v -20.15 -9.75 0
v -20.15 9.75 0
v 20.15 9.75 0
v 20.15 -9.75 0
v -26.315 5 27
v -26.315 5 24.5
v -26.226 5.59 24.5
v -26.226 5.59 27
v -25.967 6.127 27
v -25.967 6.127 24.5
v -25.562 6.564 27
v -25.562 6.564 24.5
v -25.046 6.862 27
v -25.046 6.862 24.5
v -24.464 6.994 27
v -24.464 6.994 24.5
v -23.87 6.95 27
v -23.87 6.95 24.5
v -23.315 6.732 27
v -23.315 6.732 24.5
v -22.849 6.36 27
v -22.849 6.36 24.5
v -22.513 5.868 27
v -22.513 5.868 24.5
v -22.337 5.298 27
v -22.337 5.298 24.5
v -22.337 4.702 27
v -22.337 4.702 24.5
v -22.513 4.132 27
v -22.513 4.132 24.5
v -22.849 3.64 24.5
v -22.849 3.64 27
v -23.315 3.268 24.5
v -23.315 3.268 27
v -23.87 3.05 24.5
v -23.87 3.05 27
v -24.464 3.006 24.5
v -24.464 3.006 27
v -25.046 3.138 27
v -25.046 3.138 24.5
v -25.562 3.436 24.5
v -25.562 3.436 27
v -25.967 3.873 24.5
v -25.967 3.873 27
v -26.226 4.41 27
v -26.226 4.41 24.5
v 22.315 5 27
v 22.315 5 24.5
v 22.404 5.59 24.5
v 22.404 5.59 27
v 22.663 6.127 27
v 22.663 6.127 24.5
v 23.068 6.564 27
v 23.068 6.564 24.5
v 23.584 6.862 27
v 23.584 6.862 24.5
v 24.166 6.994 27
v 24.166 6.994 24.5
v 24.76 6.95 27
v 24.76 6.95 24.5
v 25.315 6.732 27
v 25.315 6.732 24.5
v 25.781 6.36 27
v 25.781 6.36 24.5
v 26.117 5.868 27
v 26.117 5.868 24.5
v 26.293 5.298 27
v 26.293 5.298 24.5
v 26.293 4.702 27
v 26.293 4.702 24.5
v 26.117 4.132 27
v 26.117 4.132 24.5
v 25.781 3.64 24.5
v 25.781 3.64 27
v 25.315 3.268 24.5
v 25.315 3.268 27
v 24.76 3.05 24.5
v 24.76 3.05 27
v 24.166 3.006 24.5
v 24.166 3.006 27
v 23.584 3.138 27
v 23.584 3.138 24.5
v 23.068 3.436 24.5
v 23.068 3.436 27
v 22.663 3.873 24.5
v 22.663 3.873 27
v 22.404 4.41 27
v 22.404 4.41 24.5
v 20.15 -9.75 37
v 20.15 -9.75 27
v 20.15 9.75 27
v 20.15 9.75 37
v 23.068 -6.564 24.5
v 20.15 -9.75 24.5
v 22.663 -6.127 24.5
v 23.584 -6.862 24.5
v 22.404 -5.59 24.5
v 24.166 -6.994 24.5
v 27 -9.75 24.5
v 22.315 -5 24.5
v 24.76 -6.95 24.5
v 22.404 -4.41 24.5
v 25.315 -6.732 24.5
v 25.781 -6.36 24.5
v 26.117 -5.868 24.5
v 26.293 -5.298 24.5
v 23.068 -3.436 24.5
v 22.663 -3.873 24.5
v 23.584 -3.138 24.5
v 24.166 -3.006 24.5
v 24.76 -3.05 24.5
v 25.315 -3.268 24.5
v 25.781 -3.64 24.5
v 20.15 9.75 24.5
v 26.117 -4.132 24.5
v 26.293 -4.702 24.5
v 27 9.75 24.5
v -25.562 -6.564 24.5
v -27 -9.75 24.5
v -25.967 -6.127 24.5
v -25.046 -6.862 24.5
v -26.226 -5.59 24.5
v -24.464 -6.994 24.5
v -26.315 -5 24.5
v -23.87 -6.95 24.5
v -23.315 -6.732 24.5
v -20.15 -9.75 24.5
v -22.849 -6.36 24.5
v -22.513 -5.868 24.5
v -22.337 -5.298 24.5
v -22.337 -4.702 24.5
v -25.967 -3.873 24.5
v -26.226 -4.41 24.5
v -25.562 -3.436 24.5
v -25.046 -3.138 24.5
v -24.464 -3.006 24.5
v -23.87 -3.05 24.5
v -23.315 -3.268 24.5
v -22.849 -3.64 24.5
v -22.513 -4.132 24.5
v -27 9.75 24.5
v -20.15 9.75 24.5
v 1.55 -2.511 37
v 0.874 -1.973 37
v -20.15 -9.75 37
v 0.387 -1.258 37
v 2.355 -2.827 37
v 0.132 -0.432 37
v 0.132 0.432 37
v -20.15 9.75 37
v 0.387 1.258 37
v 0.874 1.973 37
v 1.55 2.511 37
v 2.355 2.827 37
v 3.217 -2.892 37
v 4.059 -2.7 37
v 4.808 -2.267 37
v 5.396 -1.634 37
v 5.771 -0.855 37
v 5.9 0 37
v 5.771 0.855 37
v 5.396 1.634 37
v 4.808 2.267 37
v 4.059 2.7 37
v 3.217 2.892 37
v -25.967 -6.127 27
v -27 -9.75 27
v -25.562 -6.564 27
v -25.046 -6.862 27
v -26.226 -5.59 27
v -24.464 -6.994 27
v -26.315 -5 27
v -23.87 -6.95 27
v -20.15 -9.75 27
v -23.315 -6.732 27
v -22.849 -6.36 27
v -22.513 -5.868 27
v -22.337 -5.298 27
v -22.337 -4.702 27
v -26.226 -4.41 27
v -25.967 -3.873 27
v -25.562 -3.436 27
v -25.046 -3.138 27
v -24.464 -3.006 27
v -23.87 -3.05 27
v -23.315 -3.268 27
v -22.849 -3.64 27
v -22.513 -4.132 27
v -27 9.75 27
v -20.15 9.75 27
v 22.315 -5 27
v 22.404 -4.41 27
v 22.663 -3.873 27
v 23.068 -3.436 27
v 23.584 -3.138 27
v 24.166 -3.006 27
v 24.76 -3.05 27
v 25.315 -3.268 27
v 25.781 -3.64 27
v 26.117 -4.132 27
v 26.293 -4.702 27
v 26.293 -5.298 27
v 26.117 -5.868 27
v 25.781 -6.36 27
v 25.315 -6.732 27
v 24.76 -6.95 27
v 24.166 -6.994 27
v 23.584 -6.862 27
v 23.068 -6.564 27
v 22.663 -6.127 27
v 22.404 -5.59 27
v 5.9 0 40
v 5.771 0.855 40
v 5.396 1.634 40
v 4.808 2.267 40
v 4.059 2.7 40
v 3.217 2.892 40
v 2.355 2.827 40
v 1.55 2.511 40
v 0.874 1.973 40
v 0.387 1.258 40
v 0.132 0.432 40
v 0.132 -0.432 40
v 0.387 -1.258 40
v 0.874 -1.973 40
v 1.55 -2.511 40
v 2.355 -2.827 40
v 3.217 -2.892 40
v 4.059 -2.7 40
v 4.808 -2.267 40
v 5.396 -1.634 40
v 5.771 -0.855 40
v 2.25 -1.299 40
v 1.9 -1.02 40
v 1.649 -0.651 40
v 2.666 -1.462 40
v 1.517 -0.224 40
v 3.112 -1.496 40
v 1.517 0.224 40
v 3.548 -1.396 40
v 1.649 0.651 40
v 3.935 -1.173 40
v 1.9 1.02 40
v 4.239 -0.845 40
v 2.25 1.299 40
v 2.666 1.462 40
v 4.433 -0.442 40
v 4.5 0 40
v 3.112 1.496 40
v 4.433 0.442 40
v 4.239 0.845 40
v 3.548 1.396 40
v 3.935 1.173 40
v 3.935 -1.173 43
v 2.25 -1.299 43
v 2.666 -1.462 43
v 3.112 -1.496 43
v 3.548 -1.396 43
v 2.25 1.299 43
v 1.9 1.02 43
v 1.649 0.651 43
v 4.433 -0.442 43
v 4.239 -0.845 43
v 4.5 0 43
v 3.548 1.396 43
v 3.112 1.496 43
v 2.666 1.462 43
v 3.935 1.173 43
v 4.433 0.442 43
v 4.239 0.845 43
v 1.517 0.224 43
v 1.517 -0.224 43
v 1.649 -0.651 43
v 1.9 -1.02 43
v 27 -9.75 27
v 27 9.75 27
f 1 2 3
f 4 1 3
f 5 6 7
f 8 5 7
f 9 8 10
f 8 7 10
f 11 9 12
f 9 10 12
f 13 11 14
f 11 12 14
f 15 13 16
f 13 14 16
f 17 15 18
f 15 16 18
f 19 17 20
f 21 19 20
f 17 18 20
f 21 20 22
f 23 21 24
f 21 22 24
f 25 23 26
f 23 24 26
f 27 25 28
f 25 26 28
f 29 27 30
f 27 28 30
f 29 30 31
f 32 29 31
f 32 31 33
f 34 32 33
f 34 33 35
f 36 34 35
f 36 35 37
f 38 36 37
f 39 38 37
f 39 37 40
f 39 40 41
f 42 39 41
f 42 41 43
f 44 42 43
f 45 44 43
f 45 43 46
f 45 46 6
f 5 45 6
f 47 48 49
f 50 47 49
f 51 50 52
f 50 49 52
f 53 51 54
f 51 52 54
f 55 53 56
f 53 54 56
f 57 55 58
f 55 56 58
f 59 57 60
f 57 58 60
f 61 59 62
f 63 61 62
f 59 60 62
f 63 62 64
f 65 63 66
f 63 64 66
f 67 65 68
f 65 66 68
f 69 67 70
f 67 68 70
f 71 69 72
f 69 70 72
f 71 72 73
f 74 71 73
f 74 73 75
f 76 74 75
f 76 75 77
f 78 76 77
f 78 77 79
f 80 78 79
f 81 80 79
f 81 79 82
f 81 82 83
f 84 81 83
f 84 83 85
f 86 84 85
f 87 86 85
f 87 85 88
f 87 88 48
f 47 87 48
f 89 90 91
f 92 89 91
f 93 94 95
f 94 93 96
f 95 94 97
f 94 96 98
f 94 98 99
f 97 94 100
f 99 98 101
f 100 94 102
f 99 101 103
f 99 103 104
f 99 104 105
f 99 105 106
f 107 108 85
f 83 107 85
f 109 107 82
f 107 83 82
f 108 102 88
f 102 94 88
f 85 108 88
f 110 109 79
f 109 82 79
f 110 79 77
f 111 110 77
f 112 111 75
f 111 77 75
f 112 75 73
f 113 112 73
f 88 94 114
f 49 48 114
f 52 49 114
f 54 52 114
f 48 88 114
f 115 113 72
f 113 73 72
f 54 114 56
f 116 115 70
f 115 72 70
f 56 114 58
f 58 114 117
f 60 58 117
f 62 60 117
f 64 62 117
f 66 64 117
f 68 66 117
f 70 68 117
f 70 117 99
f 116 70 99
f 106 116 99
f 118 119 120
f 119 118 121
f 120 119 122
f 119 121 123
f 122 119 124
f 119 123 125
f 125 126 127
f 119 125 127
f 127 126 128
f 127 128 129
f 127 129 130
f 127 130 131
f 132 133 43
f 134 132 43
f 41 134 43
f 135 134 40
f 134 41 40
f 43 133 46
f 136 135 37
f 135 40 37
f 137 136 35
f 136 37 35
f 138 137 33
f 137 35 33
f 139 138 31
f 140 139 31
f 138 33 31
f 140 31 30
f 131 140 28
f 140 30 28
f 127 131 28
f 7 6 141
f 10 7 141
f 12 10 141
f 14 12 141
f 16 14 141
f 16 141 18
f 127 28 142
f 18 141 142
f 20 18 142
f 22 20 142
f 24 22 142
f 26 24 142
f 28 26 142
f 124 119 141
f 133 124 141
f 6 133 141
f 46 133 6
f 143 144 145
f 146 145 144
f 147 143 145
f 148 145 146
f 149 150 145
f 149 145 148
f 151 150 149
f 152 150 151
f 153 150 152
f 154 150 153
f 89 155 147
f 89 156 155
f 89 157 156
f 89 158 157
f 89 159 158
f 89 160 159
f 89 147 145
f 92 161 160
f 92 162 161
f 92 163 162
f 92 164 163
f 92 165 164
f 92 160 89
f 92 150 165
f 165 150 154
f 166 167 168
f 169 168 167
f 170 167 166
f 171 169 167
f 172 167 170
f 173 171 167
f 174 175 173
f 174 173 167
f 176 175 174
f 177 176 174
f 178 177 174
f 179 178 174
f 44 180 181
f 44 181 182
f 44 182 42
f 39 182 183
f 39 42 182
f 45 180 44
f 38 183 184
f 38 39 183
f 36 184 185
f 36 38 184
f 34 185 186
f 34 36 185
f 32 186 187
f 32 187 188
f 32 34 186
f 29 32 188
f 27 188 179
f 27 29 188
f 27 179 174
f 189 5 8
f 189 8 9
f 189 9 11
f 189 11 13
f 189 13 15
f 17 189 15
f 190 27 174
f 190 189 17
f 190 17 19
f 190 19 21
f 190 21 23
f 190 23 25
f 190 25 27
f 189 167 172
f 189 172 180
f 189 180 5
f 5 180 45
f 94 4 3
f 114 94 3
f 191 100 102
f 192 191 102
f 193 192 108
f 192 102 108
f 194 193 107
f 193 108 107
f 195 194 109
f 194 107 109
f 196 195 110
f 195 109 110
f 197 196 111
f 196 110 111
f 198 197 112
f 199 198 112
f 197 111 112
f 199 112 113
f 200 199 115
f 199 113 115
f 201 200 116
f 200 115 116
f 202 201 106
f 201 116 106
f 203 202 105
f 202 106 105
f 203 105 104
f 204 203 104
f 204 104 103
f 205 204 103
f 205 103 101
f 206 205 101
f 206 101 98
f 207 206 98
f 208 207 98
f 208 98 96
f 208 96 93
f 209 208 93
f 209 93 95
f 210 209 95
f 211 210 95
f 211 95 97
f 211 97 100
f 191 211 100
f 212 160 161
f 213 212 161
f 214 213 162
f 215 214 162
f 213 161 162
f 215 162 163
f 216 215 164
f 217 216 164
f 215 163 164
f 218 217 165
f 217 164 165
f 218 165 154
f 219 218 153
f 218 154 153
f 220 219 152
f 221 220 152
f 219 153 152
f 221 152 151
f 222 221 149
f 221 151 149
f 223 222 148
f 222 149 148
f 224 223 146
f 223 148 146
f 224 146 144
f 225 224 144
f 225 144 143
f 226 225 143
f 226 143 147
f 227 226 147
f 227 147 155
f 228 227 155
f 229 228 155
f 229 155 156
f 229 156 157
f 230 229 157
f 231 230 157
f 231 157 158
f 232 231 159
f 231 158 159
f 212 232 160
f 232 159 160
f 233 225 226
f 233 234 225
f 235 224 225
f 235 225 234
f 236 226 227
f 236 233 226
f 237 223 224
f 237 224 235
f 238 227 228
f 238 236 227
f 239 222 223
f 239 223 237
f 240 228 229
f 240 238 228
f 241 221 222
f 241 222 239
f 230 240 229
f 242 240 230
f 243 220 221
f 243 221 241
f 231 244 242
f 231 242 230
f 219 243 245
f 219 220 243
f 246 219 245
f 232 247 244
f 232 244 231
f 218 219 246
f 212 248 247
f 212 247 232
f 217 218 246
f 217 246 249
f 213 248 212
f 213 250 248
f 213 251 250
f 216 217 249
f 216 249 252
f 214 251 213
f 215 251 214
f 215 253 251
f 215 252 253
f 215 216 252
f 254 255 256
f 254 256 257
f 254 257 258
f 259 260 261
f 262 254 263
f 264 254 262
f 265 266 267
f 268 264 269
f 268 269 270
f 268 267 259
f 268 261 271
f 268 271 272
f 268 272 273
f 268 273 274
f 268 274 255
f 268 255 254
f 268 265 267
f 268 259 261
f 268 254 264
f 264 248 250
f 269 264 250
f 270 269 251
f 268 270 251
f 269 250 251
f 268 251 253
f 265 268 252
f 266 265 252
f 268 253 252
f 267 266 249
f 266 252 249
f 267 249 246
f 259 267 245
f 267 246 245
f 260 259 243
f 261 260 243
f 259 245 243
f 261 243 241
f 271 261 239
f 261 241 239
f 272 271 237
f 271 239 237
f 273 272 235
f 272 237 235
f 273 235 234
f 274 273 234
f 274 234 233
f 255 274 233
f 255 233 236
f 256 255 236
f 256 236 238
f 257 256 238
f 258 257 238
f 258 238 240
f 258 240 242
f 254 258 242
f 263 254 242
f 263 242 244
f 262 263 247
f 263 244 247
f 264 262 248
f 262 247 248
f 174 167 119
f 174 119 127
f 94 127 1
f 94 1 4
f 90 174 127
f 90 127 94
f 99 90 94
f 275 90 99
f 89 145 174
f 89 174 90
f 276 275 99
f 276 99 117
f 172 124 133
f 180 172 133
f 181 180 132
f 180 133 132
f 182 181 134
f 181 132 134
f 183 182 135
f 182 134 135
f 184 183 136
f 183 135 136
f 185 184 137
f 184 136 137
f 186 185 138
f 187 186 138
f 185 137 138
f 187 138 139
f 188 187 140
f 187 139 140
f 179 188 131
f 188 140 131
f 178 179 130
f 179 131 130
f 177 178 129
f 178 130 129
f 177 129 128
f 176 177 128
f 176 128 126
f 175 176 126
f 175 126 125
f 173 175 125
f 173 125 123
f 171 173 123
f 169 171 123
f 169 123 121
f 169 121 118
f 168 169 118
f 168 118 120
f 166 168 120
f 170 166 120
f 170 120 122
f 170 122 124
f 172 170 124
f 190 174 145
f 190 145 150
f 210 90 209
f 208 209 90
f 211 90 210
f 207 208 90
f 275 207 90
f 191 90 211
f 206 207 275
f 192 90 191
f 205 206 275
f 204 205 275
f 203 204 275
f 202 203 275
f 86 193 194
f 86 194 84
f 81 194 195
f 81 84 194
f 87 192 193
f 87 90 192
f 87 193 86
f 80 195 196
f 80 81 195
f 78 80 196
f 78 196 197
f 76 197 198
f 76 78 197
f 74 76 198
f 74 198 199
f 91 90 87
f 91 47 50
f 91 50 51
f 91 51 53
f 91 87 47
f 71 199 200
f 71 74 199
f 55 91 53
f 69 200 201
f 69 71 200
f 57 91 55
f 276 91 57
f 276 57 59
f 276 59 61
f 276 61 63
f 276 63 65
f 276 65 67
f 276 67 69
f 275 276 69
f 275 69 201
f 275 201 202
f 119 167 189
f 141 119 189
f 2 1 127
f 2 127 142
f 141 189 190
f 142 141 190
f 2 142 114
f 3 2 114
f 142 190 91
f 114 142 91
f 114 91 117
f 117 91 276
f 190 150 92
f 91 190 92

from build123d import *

# Parameters (mm, degrees)
SKETCH_1_W      = 40.3
SKETCH_1_H      = 19.5
EXTRUDE_1_DEPTH = 37
SKETCH_2_R      = 2.9
EXTRUDE_2_DEPTH = 3
SKETCH_3_R      = 1.5
EXTRUDE_3_DEPTH = 3
SKETCH_4_W      = 54
SKETCH_4_H      = 19.5
EXTRUDE_4_DEPTH = 2.5
MM_1_D          = 4
MM_1_DEPTH      = 7.5
MM_1_TIP        = 1.201721238


with BuildPart() as part:
    # 草图1 → 凸台-拉伸1 (new body)
    with BuildSketch(Plane.XY):
        Rectangle(SKETCH_1_W, SKETCH_1_H)
    extrude(amount=EXTRUDE_1_DEPTH)

    # 草图2 → 凸台-拉伸2 (add)
    with BuildSketch(Plane.XY.offset(37)):
        with Locations((3, 0)):
            Circle(SKETCH_2_R)
    extrude(amount=EXTRUDE_2_DEPTH)

    # 草图3 → 凸台-拉伸3 (add)
    with BuildSketch(Plane.XY.offset(40)):
        with Locations((3, 0)):
            Circle(SKETCH_3_R)
    extrude(amount=EXTRUDE_3_DEPTH)

    # 草图4 → 凸台-拉伸4 (add)
    with BuildSketch(Plane.XY.offset(27)):
        Rectangle(SKETCH_4_W, SKETCH_4_H)
    extrude(amount=-EXTRUDE_4_DEPTH)

    # 大小mm 暗销孔1
    with Locations(Plane.XY.offset(27)):
        with Locations((-24.315, 5), (-24.315, -5), (24.315, -5), (24.315, 5)):
            Hole(MM_1_D / 2, depth=MM_1_DEPTH)
            with Locations((0, 0, -(MM_1_DEPTH + MM_1_TIP / 2))):  # 118° drill point
                Cone(0, MM_1_D / 2, MM_1_TIP, mode=Mode.SUBTRACT)


solid = part.part
